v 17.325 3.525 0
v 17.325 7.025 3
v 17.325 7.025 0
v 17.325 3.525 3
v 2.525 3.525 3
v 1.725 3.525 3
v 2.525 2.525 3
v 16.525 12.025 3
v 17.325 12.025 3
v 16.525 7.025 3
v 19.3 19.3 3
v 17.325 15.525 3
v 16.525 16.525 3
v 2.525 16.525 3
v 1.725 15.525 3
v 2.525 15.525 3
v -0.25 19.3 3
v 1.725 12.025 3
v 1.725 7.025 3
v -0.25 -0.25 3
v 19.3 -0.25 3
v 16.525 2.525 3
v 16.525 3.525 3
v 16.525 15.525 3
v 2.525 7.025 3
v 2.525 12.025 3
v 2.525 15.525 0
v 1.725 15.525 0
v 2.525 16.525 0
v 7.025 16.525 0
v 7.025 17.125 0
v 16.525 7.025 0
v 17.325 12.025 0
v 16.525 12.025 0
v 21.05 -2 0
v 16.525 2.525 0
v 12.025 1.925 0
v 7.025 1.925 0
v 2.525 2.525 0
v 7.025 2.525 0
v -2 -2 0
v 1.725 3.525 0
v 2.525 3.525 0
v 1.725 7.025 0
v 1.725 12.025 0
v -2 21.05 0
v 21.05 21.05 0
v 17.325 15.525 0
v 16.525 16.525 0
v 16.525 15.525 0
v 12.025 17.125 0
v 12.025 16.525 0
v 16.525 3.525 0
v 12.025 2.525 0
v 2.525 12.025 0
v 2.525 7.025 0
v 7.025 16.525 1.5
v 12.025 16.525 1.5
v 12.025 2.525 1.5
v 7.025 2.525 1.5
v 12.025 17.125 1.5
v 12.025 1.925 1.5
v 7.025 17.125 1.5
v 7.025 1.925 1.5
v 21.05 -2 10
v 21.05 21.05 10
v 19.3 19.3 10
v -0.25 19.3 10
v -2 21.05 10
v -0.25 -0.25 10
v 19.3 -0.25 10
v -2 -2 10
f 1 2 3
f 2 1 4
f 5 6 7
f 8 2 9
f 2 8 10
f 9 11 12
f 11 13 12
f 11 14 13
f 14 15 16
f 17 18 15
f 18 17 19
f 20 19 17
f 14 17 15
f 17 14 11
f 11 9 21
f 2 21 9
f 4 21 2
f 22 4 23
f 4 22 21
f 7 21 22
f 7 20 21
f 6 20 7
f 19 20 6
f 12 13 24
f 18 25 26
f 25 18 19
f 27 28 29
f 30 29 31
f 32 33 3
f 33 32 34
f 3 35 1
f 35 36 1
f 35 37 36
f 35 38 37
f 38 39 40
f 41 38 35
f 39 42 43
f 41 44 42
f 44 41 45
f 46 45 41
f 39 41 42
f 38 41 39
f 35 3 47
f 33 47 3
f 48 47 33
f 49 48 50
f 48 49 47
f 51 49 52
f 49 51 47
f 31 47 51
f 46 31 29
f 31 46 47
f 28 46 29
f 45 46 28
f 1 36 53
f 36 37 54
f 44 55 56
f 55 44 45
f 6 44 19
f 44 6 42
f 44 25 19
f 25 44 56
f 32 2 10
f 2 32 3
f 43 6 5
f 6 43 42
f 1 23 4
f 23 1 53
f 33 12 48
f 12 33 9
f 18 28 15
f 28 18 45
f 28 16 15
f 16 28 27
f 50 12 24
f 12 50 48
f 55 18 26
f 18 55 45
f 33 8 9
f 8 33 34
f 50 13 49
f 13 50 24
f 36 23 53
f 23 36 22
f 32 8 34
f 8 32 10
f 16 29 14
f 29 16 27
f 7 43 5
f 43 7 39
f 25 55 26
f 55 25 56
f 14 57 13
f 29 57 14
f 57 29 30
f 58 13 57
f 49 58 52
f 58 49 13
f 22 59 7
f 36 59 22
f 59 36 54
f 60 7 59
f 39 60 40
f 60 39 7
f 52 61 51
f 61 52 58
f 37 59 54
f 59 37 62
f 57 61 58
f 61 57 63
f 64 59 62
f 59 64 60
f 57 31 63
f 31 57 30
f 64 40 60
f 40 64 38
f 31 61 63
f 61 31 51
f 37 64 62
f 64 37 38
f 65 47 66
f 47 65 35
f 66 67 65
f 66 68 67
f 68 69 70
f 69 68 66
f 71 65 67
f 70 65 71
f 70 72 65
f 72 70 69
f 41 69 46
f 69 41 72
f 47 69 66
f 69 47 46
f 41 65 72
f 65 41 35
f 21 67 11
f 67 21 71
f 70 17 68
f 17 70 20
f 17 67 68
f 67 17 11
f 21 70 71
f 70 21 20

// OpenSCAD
// file: ../lib/switch.scad
/* These values can be changed inside the project if necessary */
key_space = 19.05;
plate_thickness = 3;

/* Shape options are "simple" and "complex".
 * The "simple" shape might be easier to print at an angle, but otherwise "complex" is recommended */
module switch(h = plate_thickness, shape = "complex", rotation = 0)
{
	OPENING_DEPTH  = 0.8;
	OPENING_HEIGHT = 3.5;
	SIDE = 14;
	TAB_DEPTH = 0.6;
	TAB_HEIGHT = 1.5;
	TAB_WIDTH = 5;
	translate([key_space / 2, key_space / 2])
		rotate(rotation)
			translate([-key_space / 2, -key_space / 2])
				translate([(key_space - SIDE) / 2, (key_space - SIDE) / 2])
					union()
					{
						cube([SIDE, SIDE, h]);
						if(shape == "complex")
						{
							translate([-OPENING_DEPTH, 1])                         cube([SIDE + (OPENING_DEPTH * 2), OPENING_HEIGHT, h]);
							translate([-OPENING_DEPTH, SIDE - 1 - OPENING_HEIGHT]) cube([SIDE + (OPENING_DEPTH * 2), OPENING_HEIGHT, h]);
						}
						translate([(SIDE / 2) - (TAB_WIDTH / 2), -TAB_DEPTH]) cube([TAB_WIDTH, TAB_DEPTH + SIDE + TAB_DEPTH, h - TAB_HEIGHT]);
					}
}

//switch();
// main file
include <../lib/switch.scad>

/* This is the extra distance between keycap and side wall. Increase the value
 * if your keycaps are touching the side walls. */
key_clearance = 0.25;

wall_height = 7;

wall_thickness = 1.75;

render()
	difference()
	{
		translate([-key_clearance - wall_thickness, -key_clearance - wall_thickness])
			cube([key_space + (key_clearance * 2) + (wall_thickness * 2), key_space + (key_clearance * 2) + (wall_thickness * 2), plate_thickness + wall_height]);
		translate([-key_clearance, -key_clearance, plate_thickness])
			cube([key_space + (key_clearance * 2), key_space + (key_clearance * 2), plate_thickness + wall_height]);
		switch();
	}
